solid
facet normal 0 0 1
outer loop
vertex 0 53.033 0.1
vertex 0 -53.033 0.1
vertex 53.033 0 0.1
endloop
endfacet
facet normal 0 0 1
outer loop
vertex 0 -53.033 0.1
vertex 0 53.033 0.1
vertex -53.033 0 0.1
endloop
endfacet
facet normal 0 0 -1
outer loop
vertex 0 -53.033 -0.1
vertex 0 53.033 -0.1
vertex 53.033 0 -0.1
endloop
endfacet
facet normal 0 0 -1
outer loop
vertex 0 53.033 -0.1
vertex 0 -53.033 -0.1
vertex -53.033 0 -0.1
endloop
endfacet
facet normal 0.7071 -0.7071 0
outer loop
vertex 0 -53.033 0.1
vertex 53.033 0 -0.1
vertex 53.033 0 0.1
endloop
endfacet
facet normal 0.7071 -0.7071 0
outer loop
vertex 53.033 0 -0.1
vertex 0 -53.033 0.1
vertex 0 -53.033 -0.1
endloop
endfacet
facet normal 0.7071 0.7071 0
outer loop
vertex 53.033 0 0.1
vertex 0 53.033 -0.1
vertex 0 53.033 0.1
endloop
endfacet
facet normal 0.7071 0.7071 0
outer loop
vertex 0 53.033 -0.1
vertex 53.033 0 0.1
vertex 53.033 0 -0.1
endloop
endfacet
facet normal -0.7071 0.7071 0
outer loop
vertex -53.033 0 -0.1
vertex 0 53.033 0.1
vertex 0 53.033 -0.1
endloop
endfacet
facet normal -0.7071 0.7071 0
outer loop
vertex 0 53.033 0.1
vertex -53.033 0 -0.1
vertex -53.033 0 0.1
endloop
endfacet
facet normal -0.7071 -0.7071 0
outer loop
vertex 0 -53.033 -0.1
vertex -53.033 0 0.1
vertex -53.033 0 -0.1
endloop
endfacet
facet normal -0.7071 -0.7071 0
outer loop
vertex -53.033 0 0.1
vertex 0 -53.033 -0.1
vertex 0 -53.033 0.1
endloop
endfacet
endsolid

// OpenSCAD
layerHeight = 0.2;
length = 75;

rotate([0, 0, 45]) {
    cube([length, length, layerHeight], center = true);
}
